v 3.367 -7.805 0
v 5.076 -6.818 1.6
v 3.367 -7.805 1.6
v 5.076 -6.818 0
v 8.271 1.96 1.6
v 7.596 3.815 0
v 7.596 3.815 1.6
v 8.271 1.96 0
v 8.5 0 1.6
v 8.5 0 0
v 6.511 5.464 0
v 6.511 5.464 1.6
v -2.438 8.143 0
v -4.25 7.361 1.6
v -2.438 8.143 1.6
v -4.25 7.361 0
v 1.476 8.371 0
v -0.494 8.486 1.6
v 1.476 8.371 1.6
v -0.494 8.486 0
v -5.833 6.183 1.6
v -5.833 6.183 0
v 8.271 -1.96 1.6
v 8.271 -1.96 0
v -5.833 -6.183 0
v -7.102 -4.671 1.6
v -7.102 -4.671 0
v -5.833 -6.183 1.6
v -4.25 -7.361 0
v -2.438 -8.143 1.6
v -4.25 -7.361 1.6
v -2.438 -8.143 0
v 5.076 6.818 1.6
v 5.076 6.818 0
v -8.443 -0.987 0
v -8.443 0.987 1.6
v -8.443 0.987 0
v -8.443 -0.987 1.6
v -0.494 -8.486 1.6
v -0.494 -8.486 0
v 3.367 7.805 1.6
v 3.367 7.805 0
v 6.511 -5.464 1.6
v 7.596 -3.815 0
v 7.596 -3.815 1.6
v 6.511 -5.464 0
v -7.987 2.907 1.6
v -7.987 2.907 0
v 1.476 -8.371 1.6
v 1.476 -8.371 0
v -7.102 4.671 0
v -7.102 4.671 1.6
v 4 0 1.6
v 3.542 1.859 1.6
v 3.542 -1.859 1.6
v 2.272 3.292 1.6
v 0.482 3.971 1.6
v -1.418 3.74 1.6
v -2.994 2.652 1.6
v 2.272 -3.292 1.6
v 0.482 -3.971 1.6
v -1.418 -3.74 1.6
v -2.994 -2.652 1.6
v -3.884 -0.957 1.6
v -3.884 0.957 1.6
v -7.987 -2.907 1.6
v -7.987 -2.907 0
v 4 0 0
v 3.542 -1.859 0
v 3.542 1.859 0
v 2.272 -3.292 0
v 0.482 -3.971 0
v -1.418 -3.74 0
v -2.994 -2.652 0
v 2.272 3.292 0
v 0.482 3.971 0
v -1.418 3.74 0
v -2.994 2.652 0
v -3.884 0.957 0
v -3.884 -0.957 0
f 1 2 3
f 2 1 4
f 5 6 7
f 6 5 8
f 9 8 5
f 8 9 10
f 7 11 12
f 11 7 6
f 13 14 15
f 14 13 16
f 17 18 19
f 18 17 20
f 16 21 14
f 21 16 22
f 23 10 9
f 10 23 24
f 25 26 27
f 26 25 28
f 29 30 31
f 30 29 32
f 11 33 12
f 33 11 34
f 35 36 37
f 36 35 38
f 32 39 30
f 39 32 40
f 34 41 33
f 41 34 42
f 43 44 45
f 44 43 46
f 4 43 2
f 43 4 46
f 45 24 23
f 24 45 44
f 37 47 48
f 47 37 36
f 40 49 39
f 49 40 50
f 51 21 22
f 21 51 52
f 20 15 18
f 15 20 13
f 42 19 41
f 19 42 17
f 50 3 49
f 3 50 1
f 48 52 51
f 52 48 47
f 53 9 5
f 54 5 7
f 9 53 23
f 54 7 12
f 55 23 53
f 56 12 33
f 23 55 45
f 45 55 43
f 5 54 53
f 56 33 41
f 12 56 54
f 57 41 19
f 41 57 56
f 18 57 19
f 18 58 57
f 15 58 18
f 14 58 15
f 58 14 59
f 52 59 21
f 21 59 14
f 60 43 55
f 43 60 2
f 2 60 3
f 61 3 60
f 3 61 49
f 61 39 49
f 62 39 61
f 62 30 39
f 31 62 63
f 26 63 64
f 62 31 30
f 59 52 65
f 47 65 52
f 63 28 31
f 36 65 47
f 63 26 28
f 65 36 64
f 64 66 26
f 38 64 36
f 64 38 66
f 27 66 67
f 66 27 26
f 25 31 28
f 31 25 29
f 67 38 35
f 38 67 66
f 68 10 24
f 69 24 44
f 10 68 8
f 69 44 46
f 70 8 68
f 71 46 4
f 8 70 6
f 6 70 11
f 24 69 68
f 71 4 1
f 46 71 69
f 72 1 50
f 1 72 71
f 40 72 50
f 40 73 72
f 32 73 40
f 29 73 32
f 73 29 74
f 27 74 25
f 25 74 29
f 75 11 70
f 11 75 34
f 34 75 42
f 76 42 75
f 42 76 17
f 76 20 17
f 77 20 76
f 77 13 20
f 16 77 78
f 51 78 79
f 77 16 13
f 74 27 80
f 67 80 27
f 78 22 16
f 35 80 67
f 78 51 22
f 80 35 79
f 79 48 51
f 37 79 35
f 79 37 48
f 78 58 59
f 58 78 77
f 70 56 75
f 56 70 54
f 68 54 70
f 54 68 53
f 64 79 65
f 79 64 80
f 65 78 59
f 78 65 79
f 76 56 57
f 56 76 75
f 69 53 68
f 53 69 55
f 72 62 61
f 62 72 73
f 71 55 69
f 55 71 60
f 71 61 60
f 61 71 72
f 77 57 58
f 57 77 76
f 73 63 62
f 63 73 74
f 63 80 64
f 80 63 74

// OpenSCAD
module washer_body() {
    difference() {
        cylinder(h = 1.6, d = 17.0);
        translate([0, 0, -0.1]) // Slightly lower to ensure clean subtraction
            cylinder(h = 1.8, d = 8.0);
    }
}

washer_body();
